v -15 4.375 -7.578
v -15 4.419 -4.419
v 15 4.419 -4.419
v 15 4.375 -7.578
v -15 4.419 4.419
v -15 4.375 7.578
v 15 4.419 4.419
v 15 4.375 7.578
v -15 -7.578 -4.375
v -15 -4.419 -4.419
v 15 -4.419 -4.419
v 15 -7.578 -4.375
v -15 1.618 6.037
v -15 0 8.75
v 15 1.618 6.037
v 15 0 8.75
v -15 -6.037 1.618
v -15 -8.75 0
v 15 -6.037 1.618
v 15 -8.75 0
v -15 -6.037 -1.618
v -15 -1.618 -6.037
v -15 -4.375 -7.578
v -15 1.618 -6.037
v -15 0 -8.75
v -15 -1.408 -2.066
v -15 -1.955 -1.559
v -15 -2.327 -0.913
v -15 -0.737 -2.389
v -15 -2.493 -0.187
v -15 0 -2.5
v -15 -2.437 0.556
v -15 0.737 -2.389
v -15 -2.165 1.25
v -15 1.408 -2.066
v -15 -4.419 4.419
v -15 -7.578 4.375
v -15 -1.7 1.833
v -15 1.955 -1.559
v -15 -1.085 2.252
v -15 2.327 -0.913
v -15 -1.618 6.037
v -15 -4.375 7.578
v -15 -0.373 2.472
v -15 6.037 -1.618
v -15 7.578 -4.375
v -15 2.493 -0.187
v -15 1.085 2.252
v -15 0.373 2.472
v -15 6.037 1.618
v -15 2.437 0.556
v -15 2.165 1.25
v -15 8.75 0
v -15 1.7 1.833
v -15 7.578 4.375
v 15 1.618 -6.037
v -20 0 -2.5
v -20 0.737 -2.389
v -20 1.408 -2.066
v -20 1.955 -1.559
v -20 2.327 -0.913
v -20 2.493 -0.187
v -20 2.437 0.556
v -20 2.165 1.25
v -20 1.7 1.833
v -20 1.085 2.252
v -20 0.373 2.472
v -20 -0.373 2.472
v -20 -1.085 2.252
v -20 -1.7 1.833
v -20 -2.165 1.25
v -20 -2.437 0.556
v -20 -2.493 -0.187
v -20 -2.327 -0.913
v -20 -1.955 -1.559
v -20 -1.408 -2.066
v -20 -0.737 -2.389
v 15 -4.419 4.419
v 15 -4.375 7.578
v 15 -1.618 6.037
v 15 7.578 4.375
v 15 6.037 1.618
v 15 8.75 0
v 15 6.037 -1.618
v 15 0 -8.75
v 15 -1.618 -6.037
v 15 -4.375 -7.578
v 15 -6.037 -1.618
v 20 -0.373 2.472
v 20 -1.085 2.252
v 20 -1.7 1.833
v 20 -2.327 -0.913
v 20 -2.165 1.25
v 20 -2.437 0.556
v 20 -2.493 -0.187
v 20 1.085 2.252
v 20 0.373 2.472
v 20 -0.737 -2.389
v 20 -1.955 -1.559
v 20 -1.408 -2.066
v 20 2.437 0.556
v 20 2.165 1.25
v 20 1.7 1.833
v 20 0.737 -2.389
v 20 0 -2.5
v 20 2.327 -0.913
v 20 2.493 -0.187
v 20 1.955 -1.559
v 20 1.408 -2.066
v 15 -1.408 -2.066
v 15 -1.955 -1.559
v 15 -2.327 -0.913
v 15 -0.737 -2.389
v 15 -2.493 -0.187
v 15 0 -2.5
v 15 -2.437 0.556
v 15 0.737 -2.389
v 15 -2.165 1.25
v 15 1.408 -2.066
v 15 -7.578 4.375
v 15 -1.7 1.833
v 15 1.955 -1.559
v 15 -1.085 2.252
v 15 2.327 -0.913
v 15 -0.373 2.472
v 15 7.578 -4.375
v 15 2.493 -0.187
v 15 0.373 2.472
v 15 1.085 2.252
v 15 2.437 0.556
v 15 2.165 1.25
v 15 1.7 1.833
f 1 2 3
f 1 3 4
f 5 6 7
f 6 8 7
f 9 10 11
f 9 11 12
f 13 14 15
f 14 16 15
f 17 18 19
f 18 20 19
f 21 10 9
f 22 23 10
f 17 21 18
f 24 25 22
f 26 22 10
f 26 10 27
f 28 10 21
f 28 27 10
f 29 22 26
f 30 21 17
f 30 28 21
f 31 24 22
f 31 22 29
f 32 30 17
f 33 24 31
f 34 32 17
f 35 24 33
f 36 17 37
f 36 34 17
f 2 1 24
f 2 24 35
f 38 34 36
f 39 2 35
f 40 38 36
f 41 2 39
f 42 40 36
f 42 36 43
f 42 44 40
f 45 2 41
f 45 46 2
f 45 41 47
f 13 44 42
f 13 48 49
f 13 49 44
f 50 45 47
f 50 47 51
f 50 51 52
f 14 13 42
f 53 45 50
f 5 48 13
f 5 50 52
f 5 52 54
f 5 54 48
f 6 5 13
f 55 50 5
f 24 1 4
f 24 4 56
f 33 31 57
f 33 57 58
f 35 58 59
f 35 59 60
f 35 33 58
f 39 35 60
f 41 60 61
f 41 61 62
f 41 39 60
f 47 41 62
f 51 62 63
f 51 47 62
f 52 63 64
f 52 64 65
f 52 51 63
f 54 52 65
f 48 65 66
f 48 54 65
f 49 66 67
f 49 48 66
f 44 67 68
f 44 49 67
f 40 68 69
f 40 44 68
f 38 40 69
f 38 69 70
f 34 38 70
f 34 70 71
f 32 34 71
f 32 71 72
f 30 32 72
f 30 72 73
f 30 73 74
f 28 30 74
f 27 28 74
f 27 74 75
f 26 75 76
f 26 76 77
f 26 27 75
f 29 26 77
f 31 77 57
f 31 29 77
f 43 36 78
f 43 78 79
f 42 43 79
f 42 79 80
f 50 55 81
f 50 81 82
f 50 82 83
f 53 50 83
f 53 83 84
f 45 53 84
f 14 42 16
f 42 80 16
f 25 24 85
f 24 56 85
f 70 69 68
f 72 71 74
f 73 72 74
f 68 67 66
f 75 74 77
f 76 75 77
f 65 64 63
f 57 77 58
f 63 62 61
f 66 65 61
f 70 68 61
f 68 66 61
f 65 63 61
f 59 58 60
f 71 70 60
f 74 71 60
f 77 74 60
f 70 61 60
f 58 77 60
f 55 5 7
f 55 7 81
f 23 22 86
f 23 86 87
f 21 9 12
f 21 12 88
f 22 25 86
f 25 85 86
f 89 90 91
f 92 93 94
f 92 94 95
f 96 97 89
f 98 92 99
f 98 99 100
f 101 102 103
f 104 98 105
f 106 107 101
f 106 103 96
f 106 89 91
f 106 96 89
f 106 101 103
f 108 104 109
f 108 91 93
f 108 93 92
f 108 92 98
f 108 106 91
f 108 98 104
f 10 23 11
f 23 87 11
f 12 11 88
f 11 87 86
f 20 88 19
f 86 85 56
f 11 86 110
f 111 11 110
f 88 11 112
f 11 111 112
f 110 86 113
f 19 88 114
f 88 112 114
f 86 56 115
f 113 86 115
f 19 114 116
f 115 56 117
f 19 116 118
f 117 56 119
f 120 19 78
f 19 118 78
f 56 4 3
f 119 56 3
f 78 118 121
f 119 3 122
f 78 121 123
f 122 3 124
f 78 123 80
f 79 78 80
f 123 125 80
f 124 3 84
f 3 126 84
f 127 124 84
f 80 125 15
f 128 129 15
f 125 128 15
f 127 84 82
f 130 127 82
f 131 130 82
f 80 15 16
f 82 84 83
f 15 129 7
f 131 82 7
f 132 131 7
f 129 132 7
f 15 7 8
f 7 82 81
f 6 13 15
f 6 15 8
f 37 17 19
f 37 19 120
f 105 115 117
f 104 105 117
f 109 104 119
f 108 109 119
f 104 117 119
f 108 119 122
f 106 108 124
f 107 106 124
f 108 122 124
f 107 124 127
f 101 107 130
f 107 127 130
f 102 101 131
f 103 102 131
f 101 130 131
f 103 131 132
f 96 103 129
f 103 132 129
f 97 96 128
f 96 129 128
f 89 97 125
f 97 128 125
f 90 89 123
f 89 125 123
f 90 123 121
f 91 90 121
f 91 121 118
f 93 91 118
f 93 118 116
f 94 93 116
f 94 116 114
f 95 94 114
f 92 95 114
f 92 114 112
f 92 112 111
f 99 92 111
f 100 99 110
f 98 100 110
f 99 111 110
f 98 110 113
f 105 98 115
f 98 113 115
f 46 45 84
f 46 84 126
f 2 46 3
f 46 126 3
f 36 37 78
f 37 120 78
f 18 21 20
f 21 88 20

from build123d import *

# Parameters (mm, degrees)
BOSS_EXTRUDE1_DEPTH = 15
SKETCH4_R           = 2.5
BOSS_EXTRUDE3_DEPTH = 5


with BuildPart() as part:
    # Sketch1 → Boss-Extrude1 (new body)
    with BuildSketch(Plane(origin=(0, 0, 0), x_dir=(0, 0, -1), z_dir=(1, 0, 0))):
        Polygon((0, 8.75), (1.617619032, 6.037036414), (4.375, 7.577722283), (4.419417382, 4.419417382), (7.577722283, 4.375), (6.037036414, 1.617619032), (8.75, 0), (6.037036414, -1.617619032), (7.577722283, -4.375), (4.419417382, -4.419417382), (4.375, -7.577722283), (1.617619032, -6.037036414), (0, -8.75), (-1.617619032, -6.037036414), (-4.375, -7.577722283), (-4.419417382, -4.419417382), (-7.577722283, -4.375), (-6.037036414, -1.617619032), (-8.75, 0), (-6.037036414, 1.617619032), (-7.577722283, 4.375), (-4.419417382, 4.419417382), (-4.375, 7.577722283), (-1.617619032, 6.037036414), align=None)
    boss_extrude1 = extrude(amount=BOSS_EXTRUDE1_DEPTH)

    # Sketch4 → Boss-Extrude3 (add)
    with BuildSketch(Plane(origin=(15, 0, 0), x_dir=(0, 0, -1), z_dir=(1, 0, 0))):
        Circle(SKETCH4_R)
    boss_extrude3 = extrude(amount=BOSS_EXTRUDE3_DEPTH)

    # Mirror1: Boss-Extrude1, Boss-Extrude3 across plane
    add(boss_extrude1.mirror(Plane(origin=(0, 0, 0), x_dir=(0, 0, 1), z_dir=(1, 0, 0))))
    add(boss_extrude3.mirror(Plane(origin=(0, 0, 0), x_dir=(0, 0, 1), z_dir=(1, 0, 0))))


solid = part.part
